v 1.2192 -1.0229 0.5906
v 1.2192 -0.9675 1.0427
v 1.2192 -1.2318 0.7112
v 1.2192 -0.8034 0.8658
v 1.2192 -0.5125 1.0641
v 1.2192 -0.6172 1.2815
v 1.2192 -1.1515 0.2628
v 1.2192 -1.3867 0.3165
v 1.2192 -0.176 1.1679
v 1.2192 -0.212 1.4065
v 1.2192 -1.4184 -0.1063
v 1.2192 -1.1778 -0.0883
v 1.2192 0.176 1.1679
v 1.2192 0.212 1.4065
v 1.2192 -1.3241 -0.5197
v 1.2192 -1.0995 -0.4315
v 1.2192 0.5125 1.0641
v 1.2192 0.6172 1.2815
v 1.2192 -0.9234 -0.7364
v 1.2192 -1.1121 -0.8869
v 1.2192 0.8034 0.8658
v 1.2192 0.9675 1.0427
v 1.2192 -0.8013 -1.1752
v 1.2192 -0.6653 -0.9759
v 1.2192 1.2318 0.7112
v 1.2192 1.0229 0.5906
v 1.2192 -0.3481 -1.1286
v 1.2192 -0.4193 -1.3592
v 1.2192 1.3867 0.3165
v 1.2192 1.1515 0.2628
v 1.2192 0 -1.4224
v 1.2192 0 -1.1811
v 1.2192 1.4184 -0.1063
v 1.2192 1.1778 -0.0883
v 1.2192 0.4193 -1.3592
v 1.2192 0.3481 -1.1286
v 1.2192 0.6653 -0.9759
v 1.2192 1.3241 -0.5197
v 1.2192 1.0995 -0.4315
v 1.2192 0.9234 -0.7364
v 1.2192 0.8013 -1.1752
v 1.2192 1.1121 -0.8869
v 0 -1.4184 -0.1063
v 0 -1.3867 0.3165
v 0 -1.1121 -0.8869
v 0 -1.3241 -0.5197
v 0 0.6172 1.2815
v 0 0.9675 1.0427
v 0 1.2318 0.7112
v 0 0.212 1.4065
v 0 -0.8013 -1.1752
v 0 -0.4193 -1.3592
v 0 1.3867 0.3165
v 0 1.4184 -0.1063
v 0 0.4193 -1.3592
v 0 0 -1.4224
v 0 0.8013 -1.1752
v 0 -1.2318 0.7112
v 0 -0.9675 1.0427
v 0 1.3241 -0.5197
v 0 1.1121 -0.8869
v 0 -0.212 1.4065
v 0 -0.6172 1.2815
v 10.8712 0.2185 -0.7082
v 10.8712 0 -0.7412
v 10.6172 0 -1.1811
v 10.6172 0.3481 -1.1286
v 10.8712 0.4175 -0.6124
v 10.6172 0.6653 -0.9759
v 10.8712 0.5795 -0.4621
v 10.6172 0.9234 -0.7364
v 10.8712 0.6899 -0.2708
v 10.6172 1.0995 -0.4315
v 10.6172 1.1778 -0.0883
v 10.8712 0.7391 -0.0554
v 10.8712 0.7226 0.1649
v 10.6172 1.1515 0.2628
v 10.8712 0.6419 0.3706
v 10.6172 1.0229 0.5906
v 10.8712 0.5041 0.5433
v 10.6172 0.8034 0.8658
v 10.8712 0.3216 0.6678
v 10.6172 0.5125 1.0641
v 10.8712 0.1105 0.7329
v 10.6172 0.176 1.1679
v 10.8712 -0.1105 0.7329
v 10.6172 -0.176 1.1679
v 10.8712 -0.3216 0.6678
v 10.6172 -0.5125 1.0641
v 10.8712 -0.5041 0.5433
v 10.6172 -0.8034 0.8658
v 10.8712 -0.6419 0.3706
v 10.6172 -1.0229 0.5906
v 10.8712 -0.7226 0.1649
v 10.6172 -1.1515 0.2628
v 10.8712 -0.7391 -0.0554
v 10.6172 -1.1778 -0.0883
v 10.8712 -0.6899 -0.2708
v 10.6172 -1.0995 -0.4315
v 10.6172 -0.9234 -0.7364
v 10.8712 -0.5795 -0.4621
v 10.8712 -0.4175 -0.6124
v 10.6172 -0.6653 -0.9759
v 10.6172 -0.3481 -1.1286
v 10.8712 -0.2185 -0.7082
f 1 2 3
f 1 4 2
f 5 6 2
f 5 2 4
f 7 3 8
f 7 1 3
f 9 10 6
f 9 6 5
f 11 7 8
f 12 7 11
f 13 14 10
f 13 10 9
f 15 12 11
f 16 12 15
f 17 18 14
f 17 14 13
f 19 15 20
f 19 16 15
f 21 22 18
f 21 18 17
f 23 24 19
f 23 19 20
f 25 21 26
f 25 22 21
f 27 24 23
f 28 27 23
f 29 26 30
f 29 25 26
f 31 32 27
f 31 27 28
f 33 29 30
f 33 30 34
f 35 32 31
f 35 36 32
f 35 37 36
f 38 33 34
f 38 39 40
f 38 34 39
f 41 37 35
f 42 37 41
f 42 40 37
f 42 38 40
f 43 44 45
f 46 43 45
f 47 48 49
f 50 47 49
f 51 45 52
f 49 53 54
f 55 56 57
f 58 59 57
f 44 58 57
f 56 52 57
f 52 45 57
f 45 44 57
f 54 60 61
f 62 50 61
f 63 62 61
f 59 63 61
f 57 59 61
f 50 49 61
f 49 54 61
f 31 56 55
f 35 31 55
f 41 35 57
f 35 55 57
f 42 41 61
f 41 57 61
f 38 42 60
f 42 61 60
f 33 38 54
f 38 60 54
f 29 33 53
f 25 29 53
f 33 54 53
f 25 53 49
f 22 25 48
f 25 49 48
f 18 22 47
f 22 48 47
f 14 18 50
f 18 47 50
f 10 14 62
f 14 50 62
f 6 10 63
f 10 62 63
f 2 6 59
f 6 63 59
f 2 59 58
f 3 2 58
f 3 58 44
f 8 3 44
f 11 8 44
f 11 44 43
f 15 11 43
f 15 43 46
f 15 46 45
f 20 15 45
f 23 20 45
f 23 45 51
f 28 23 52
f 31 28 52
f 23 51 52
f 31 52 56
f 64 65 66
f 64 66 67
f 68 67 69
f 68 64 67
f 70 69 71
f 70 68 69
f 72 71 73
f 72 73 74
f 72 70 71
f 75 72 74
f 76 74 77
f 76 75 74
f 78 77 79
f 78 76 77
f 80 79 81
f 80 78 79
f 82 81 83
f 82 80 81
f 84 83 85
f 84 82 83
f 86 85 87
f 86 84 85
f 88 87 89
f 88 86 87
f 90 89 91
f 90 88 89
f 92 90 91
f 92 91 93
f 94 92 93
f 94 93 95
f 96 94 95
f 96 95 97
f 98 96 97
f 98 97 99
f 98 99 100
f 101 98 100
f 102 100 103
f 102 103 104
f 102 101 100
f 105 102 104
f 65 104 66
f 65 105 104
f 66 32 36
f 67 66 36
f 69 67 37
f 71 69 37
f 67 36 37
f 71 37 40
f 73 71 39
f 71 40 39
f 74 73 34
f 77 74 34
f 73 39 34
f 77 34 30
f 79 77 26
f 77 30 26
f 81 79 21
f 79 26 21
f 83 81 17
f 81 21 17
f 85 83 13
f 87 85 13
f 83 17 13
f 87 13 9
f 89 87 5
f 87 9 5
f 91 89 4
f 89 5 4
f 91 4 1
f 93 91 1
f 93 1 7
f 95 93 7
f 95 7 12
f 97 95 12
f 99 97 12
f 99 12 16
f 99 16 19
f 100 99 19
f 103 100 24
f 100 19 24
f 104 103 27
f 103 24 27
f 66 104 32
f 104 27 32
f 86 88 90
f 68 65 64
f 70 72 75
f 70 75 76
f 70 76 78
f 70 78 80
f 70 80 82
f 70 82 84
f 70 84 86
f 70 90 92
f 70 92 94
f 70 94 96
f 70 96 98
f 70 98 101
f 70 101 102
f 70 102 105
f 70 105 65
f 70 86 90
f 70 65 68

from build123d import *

# Parameters (mm, degrees)
SKETCH1_R           = 1.4224
BOSS_EXTRUDE1_DEPTH = 1.2192
SKETCH2_R           = 1.1811
BOSS_EXTRUDE2_DEPTH = 9.652
CHAMFER1_SIZE       = 0.254
CHAMFER1_SIZE2      = 0.439940905


with BuildPart() as part:
    # Sketch1 → Boss-Extrude1 (new body)
    with BuildSketch(Plane(origin=(0, 0, 0), x_dir=(0, 0, -1), z_dir=(1, 0, 0))):
        Circle(SKETCH1_R)
    extrude(amount=BOSS_EXTRUDE1_DEPTH)

    # Sketch2 → Boss-Extrude2 (add)
    with BuildSketch(Plane(origin=(1.2192, 0, 0), x_dir=(0, 0, -1), z_dir=(1, 0, 0))):
        Circle(SKETCH2_R)
    extrude(amount=BOSS_EXTRUDE2_DEPTH)

    # Chamfer1
    chamfer1_edges = [part.edges().sort_by_distance(p)[0] for p in [
        (10.8712, 0, 1.1811),
    ]]
    chamfer1_side = [part.faces().sort_by_distance(p)[0] for p in [
        (6.0452, 0, 1.1811),
    ]]
    chamfer(chamfer1_edges, length=CHAMFER1_SIZE, length2=CHAMFER1_SIZE2, reference=chamfer1_side[0])


solid = part.part
